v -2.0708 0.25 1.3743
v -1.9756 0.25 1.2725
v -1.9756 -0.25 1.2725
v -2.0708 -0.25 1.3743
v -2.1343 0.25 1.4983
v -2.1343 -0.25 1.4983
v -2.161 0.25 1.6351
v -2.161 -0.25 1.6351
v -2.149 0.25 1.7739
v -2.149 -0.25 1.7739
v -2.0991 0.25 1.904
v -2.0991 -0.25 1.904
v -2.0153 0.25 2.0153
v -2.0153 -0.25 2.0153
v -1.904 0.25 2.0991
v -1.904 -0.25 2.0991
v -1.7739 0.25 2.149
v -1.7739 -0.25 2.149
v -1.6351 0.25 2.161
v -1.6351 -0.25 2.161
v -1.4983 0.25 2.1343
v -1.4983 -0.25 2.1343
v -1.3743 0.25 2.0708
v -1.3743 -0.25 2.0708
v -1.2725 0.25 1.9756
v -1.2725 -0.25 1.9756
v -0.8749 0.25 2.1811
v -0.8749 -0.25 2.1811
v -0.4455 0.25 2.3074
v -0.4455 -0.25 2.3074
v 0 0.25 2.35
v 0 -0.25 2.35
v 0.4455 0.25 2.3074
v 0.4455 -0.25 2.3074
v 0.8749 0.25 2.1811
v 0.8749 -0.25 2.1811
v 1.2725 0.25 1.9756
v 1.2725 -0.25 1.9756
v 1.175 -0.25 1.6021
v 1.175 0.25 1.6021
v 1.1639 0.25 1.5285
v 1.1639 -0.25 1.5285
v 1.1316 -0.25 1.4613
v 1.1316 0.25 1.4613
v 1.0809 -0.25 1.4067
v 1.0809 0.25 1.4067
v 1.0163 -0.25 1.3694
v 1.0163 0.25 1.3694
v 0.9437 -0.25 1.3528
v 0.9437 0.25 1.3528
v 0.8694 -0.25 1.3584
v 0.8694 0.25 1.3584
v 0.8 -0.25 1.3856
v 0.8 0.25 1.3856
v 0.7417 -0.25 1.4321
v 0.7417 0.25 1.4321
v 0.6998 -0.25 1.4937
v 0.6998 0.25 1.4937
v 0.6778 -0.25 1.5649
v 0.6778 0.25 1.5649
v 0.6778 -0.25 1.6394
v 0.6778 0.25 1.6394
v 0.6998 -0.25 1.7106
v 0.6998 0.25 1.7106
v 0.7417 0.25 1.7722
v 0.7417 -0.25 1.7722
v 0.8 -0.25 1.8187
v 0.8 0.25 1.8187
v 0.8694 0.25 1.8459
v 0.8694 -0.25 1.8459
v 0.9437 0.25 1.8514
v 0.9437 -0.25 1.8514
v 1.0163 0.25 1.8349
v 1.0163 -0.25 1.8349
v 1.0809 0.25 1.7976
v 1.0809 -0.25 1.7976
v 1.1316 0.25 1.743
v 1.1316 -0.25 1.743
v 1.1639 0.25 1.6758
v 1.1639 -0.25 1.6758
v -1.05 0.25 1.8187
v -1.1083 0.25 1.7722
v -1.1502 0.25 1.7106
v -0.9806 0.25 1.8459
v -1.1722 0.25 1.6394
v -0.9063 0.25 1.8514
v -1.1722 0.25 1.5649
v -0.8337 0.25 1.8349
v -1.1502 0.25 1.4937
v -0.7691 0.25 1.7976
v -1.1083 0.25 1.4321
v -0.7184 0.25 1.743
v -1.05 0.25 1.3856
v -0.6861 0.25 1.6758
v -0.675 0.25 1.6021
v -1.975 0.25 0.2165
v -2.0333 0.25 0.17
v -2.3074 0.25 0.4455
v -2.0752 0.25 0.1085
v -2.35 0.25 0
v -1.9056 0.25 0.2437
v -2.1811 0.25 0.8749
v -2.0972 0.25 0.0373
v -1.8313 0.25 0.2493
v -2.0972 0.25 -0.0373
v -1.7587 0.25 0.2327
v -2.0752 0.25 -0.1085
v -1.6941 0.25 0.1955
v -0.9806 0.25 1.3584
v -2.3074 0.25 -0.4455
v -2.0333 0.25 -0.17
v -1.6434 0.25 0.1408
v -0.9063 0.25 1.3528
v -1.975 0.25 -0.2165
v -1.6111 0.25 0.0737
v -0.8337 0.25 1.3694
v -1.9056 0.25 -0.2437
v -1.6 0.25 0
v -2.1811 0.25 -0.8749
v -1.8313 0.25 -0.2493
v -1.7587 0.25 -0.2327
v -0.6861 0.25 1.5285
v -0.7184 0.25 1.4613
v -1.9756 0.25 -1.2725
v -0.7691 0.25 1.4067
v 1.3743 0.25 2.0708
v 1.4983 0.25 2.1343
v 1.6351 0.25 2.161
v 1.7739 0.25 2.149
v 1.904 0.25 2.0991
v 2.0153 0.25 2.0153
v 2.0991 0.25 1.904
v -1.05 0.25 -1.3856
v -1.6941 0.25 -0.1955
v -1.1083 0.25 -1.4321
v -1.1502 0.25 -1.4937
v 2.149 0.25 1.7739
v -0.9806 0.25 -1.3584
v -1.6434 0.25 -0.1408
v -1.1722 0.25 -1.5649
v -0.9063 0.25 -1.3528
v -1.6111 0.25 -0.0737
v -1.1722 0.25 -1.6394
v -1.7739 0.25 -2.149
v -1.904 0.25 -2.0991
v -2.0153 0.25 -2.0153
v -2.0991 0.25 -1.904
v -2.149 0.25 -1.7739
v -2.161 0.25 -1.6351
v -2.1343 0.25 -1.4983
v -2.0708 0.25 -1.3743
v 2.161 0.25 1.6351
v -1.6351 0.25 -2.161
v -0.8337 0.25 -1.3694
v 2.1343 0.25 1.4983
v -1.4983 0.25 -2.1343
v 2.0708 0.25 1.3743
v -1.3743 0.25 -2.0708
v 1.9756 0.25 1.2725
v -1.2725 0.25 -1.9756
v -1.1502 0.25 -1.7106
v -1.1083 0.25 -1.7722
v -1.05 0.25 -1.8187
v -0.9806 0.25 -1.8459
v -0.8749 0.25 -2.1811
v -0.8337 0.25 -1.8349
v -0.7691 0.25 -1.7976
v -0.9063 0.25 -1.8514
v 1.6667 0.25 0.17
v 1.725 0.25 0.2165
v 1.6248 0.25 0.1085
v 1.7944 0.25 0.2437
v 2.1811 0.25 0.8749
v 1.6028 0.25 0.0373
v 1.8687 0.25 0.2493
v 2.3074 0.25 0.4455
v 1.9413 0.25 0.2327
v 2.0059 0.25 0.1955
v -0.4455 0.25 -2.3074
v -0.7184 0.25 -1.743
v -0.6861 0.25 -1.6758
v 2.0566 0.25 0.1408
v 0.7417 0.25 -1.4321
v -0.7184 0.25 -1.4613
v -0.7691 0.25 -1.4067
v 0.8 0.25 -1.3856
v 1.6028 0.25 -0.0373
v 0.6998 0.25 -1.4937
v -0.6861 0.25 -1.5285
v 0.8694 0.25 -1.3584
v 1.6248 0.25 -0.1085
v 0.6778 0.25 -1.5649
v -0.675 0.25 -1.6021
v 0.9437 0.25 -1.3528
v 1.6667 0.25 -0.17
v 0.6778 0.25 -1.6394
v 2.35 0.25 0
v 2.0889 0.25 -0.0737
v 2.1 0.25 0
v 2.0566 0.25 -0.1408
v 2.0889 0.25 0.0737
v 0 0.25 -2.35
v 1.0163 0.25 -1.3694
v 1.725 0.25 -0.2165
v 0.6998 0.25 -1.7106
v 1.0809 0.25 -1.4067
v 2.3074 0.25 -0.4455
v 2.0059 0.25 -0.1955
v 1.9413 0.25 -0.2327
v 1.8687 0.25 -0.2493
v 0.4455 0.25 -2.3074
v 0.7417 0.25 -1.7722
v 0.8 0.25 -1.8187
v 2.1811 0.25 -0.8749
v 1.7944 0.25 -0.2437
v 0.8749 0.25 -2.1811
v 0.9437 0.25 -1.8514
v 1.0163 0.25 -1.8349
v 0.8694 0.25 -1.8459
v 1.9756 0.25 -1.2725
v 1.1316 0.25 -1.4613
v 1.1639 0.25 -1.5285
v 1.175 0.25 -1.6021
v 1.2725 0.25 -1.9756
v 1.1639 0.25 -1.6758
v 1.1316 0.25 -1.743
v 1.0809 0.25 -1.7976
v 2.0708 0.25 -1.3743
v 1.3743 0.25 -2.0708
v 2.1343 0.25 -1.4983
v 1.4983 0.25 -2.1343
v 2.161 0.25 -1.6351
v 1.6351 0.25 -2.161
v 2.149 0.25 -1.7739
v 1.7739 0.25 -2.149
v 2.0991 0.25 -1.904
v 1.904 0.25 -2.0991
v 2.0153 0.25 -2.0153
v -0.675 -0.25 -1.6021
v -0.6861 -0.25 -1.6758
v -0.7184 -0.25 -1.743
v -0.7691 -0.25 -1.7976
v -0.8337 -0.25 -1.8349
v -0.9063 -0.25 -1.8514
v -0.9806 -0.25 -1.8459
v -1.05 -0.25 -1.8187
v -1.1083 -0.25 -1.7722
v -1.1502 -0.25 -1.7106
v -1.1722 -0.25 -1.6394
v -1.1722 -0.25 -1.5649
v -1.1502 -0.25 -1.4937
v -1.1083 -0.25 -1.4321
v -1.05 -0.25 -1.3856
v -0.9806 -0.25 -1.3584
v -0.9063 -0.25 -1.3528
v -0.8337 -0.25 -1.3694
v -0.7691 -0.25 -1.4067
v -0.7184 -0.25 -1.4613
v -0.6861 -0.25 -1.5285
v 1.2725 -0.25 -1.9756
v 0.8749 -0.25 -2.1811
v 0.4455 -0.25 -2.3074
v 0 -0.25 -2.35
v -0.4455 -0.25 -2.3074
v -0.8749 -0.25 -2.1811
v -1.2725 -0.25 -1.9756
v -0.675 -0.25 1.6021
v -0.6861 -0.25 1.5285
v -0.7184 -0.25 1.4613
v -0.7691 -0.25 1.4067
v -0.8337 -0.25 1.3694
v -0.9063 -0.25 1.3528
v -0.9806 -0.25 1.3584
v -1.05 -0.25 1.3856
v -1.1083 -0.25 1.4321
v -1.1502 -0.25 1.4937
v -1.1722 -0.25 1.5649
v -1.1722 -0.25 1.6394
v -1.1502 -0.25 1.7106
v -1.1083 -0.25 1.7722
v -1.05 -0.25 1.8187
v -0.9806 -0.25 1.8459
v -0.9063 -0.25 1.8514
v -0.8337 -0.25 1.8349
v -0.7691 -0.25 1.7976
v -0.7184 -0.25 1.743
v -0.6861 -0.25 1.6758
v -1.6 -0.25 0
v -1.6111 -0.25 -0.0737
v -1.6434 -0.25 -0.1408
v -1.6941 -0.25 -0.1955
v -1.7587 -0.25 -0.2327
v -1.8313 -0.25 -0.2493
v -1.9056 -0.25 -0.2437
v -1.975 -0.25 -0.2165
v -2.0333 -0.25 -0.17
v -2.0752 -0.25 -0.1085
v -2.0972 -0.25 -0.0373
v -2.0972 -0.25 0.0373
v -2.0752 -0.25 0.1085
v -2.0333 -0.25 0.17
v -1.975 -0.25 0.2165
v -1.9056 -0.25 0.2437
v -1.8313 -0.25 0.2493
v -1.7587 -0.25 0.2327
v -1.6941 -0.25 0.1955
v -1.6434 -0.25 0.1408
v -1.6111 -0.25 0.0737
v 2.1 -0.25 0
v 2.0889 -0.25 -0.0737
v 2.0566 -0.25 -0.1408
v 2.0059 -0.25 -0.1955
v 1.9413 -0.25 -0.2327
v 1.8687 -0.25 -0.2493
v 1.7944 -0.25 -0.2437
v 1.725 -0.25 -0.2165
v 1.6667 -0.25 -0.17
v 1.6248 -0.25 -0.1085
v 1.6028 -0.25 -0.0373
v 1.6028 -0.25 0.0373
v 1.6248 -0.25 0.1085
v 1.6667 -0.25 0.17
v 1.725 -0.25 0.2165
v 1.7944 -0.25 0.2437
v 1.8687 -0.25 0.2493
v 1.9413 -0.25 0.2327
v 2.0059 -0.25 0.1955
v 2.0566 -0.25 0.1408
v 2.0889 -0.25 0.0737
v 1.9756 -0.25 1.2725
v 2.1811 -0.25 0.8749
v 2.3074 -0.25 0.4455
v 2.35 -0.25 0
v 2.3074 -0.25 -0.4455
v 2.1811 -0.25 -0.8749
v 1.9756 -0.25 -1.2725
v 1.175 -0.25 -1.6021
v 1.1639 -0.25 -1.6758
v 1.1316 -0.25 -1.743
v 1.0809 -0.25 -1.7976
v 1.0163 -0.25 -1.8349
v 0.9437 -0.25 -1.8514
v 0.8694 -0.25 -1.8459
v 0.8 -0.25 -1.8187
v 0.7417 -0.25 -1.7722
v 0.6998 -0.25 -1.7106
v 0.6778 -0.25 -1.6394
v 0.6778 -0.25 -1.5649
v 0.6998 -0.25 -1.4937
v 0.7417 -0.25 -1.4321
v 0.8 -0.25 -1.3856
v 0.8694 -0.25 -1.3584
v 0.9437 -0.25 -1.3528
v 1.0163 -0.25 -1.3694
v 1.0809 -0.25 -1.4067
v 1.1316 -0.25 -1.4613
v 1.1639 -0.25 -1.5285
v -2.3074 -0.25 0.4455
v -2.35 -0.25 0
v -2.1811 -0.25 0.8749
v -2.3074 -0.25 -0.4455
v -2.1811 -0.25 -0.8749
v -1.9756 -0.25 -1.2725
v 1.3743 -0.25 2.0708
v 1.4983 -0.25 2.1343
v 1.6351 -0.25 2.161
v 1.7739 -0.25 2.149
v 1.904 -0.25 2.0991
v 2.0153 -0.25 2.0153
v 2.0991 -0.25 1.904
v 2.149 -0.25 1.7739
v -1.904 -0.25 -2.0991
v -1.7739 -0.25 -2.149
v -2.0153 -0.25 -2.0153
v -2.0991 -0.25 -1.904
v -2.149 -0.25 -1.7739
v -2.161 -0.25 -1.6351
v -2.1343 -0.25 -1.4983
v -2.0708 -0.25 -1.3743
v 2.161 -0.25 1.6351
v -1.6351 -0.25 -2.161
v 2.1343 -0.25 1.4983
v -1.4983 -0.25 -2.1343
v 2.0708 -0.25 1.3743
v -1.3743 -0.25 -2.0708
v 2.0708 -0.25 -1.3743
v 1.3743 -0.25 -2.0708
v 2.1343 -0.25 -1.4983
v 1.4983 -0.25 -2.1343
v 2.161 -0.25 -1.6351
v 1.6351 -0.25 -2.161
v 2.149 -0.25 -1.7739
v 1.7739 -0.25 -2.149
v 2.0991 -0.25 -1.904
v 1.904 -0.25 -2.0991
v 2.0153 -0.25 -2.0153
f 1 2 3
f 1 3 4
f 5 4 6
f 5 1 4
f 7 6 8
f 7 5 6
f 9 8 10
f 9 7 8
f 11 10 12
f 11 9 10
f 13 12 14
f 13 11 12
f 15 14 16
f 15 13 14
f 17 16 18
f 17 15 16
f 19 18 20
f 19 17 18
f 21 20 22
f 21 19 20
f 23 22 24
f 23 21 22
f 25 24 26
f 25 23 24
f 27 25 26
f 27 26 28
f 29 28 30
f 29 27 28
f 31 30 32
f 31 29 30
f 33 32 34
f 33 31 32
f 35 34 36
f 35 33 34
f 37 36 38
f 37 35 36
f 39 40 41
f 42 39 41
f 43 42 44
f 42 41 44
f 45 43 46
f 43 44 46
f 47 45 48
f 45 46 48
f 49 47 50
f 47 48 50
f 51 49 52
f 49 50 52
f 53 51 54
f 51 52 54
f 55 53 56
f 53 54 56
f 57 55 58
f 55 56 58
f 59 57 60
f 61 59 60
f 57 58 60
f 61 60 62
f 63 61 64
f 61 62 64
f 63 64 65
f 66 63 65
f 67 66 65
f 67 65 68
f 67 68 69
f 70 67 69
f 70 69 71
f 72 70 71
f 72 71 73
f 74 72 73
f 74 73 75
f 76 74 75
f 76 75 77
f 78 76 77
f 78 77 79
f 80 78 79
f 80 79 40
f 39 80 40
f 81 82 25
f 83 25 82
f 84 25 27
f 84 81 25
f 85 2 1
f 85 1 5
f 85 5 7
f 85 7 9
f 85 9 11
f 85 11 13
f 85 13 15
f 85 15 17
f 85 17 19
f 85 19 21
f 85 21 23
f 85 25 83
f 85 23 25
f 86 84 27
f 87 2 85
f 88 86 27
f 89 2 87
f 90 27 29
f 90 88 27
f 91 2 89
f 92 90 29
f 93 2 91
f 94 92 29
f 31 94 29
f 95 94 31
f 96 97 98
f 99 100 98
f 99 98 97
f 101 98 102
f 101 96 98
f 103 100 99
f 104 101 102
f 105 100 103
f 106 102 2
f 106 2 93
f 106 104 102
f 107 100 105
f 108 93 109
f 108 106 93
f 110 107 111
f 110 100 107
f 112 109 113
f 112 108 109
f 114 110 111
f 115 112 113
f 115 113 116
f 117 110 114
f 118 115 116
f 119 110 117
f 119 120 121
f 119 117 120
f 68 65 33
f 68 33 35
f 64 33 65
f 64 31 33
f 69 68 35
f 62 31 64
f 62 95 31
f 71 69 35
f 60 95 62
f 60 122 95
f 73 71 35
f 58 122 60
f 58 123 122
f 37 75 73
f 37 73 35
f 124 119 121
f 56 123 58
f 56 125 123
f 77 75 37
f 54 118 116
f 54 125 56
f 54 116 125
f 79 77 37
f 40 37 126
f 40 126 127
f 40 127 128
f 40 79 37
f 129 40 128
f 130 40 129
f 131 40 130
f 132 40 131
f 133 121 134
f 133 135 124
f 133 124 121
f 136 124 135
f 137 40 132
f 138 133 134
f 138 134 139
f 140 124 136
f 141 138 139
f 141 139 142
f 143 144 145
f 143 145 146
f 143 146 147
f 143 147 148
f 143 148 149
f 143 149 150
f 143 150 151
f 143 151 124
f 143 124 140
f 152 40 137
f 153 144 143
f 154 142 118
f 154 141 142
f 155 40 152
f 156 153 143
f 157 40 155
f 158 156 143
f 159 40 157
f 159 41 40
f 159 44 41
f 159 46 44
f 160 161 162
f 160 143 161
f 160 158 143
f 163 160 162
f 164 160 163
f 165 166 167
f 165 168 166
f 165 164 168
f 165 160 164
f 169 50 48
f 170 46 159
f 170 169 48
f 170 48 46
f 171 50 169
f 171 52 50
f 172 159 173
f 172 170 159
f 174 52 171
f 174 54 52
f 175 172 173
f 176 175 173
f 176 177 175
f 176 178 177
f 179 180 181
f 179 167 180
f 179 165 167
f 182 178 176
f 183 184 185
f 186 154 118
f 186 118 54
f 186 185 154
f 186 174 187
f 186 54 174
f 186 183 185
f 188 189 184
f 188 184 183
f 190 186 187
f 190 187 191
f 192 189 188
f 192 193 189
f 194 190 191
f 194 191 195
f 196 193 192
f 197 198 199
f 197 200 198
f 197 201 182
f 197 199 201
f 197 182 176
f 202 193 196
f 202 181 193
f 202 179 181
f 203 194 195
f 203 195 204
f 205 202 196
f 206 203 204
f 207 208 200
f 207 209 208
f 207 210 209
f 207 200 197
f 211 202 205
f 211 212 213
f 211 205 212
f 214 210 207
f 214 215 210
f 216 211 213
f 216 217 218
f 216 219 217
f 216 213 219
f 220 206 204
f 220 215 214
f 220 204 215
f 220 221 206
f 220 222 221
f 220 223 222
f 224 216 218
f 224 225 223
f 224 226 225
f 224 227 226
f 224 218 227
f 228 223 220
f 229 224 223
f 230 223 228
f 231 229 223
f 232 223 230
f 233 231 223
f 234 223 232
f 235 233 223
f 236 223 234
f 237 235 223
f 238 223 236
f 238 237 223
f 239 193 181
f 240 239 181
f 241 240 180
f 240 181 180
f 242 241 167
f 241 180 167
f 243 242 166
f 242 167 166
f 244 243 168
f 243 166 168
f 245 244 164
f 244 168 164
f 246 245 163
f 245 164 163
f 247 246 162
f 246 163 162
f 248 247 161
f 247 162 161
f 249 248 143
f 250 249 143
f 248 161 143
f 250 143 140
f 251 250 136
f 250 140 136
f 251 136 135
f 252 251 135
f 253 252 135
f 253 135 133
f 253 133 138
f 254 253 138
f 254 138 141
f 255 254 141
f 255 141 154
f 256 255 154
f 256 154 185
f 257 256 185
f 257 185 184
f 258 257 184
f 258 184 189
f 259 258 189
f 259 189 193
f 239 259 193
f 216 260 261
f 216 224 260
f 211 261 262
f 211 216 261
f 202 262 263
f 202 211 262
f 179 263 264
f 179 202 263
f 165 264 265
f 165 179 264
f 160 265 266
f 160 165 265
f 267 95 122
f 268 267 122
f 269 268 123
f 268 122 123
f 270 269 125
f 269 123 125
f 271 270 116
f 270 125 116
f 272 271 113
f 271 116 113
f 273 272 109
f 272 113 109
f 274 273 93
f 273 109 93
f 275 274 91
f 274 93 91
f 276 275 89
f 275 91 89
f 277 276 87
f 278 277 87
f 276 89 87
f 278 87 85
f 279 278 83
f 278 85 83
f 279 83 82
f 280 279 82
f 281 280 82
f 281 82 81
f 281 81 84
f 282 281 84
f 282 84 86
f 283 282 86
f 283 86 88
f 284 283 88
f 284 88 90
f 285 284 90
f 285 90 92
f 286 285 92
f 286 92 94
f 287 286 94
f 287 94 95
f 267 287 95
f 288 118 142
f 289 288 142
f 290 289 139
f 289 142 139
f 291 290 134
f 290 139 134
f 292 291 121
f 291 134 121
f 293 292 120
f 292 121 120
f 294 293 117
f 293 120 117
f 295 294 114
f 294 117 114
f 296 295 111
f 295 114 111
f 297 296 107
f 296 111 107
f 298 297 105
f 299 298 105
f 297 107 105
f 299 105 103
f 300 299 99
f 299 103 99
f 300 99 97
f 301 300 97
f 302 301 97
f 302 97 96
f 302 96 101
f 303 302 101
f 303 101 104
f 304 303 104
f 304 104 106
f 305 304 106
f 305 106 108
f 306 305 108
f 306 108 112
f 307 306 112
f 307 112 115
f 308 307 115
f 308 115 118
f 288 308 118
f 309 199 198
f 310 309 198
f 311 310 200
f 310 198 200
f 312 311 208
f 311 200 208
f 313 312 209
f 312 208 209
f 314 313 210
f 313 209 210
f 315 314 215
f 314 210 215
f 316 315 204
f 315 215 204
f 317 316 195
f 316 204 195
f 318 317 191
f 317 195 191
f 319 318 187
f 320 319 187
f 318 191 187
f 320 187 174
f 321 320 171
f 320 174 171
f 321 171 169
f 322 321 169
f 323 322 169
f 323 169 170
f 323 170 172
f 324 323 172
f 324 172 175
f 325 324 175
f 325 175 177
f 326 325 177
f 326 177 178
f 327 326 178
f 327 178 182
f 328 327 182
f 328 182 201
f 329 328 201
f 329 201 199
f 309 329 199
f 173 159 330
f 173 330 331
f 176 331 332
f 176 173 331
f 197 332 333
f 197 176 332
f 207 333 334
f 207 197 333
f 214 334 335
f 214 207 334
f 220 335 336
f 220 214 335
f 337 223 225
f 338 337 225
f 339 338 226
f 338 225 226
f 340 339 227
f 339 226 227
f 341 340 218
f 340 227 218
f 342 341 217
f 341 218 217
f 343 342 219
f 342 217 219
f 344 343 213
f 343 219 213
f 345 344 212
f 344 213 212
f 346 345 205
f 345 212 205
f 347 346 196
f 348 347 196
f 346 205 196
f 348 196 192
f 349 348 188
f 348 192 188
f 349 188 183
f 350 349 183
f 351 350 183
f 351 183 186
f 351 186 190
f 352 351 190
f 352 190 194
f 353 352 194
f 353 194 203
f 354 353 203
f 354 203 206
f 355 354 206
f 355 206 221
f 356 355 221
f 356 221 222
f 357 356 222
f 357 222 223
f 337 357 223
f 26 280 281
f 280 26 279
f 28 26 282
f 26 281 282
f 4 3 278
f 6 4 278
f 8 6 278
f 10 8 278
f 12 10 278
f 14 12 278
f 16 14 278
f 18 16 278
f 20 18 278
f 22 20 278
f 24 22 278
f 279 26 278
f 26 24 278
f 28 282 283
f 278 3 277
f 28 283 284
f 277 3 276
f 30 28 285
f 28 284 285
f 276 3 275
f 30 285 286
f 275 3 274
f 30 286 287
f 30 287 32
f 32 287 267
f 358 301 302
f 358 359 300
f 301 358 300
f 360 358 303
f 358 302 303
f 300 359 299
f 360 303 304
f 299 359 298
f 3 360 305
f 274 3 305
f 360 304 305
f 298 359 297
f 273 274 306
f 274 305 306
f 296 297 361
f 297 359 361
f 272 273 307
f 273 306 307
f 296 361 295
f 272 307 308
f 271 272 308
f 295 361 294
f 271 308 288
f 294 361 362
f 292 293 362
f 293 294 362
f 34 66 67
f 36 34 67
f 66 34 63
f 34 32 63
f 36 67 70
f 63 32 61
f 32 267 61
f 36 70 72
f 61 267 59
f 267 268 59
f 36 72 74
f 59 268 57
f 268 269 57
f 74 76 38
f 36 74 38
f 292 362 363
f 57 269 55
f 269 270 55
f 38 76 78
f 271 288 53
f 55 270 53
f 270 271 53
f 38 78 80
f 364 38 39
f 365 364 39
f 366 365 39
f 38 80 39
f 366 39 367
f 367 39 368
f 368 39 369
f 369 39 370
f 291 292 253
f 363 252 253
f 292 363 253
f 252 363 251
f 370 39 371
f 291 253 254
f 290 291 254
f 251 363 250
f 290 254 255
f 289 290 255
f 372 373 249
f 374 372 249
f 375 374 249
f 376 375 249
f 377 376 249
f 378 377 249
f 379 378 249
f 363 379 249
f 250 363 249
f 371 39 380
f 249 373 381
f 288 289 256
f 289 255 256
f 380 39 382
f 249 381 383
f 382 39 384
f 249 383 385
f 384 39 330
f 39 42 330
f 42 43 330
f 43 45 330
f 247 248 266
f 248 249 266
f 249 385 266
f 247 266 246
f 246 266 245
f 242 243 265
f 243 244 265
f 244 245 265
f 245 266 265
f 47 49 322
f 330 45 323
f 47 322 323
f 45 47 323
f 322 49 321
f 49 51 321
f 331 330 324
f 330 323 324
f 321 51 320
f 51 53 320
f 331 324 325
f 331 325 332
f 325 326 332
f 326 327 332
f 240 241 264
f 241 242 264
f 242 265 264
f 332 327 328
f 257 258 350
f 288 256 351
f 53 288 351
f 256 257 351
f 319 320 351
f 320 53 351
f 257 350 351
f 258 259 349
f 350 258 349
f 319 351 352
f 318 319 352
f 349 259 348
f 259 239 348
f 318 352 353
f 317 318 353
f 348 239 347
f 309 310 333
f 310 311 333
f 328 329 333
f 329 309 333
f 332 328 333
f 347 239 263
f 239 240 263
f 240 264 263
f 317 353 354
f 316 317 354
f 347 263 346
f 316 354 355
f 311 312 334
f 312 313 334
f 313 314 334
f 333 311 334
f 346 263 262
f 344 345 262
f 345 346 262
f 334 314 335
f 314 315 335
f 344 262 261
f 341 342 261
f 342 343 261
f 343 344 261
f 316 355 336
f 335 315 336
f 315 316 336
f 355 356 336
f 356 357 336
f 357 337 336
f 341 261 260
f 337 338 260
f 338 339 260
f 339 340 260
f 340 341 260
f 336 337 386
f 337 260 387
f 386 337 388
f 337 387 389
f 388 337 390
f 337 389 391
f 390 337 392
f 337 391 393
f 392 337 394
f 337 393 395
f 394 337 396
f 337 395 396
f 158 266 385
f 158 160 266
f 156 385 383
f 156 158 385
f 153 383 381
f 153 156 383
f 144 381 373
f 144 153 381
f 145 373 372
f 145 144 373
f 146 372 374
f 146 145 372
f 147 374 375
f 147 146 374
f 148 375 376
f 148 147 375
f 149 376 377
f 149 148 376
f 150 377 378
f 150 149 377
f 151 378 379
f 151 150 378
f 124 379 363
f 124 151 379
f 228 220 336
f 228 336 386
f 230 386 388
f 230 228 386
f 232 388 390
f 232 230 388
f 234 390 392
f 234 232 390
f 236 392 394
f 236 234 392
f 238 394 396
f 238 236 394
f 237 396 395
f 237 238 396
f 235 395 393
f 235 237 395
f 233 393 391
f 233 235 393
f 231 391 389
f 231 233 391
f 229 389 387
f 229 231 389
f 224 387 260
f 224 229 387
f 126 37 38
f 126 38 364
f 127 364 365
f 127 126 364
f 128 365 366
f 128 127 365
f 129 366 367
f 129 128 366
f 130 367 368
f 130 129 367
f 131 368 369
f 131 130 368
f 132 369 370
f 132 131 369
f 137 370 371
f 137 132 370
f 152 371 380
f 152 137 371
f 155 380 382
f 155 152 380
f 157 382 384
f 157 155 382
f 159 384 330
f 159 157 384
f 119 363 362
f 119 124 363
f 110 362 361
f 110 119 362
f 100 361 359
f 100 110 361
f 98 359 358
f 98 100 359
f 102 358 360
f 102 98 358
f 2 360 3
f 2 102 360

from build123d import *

# Parameters (mm, degrees)
BOSS_EXTRUDE1_DEPTH = 0.25
CUT_EXTRUDE1_REACH  = 2.5
SKETCH2_R           = 0.25


with BuildPart() as part:
    # Sketch1 → Boss-Extrude1 (new body, symmetric)
    with BuildSketch(Plane(origin=(0, 0, 0), x_dir=(1, 0, 0), z_dir=(0, 1, 0))):
        with BuildLine():
            ThreePointArc((-1.975635929, 1.272541817), (-2.35, 0), (-1.975635929, -1.272541817))
            ThreePointArc((-1.975635929, -1.272541817), (-2.015254326, -2.015254326), (-1.272541817, -1.975635929))
            ThreePointArc((-1.272541817, -1.975635929), (0, -2.35), (1.272541817, -1.975635929))
            ThreePointArc((1.272541817, -1.975635929), (2.015254326, -2.015254326), (1.975635929, -1.272541817))
            ThreePointArc((1.975635929, -1.272541817), (2.35, 0), (1.975635929, 1.272541817))
            ThreePointArc((1.975635929, 1.272541817), (2.015254326, 2.015254326), (1.272541817, 1.975635929))
            ThreePointArc((1.272541817, 1.975635929), (0, 2.35), (-1.272541817, 1.975635929))
            ThreePointArc((-1.272541817, 1.975635929), (-2.015254326, 2.015254326), (-1.975635929, 1.272541817))
        make_face()
    extrude(amount=BOSS_EXTRUDE1_DEPTH, both=True)

    # Sketch2 → Cut-Extrude1 (cut, up to next)
    with BuildSketch(Plane(origin=(0, 0.25, 0), x_dir=(1, 0, 0), z_dir=(0, 1, 0)), mode=Mode.PRIVATE) as cut_extrude1_sk1:
        with Locations((-1.85, 0)):
            Circle(SKETCH2_R)
    cut_extrude1_tool1 = extrude(cut_extrude1_sk1.sketch, amount=-CUT_EXTRUDE1_REACH, mode=Mode.PRIVATE) & part.part
    add(cut_extrude1_tool1.solids().sort_by_distance((-1.85, 0.25, 0))[0], mode=Mode.SUBTRACT)
    # Sketch2 → Cut-Extrude1 (cut, up to next)
    with BuildSketch(Plane(origin=(0, 0.25, 0), x_dir=(1, 0, 0), z_dir=(0, 1, 0)), mode=Mode.PRIVATE) as cut_extrude1_sk2:
        with Locations((-0.925, 1.602146997)):
            Circle(SKETCH2_R)
    cut_extrude1_tool2 = extrude(cut_extrude1_sk2.sketch, amount=-CUT_EXTRUDE1_REACH, mode=Mode.PRIVATE) & part.part
    add(cut_extrude1_tool2.solids().sort_by_distance((-0.925, 0.25, -1.602147))[0], mode=Mode.SUBTRACT)
    # Sketch2 → Cut-Extrude1 (cut, up to next)
    with BuildSketch(Plane(origin=(0, 0.25, 0), x_dir=(1, 0, 0), z_dir=(0, 1, 0)), mode=Mode.PRIVATE) as cut_extrude1_sk3:
        with Locations((0.925, 1.602146997)):
            Circle(SKETCH2_R)
    cut_extrude1_tool3 = extrude(cut_extrude1_sk3.sketch, amount=-CUT_EXTRUDE1_REACH, mode=Mode.PRIVATE) & part.part
    add(cut_extrude1_tool3.solids().sort_by_distance((0.925, 0.25, -1.602147))[0], mode=Mode.SUBTRACT)
    # Sketch2 → Cut-Extrude1 (cut, up to next)
    with BuildSketch(Plane(origin=(0, 0.25, 0), x_dir=(1, 0, 0), z_dir=(0, 1, 0)), mode=Mode.PRIVATE) as cut_extrude1_sk4:
        with Locations((1.85, 0)):
            Circle(SKETCH2_R)
    cut_extrude1_tool4 = extrude(cut_extrude1_sk4.sketch, amount=-CUT_EXTRUDE1_REACH, mode=Mode.PRIVATE) & part.part
    add(cut_extrude1_tool4.solids().sort_by_distance((1.85, 0.25, 0))[0], mode=Mode.SUBTRACT)
    # Sketch2 → Cut-Extrude1 (cut, up to next)
    with BuildSketch(Plane(origin=(0, 0.25, 0), x_dir=(1, 0, 0), z_dir=(0, 1, 0)), mode=Mode.PRIVATE) as cut_extrude1_sk5:
        with Locations((0.925, -1.602146997)):
            Circle(SKETCH2_R)
    cut_extrude1_tool5 = extrude(cut_extrude1_sk5.sketch, amount=-CUT_EXTRUDE1_REACH, mode=Mode.PRIVATE) & part.part
    add(cut_extrude1_tool5.solids().sort_by_distance((0.925, 0.25, 1.602147))[0], mode=Mode.SUBTRACT)
    # Sketch2 → Cut-Extrude1 (cut, up to next)
    with BuildSketch(Plane(origin=(0, 0.25, 0), x_dir=(1, 0, 0), z_dir=(0, 1, 0)), mode=Mode.PRIVATE) as cut_extrude1_sk6:
        with Locations((-0.925, -1.602146997)):
            Circle(SKETCH2_R)
    cut_extrude1_tool6 = extrude(cut_extrude1_sk6.sketch, amount=-CUT_EXTRUDE1_REACH, mode=Mode.PRIVATE) & part.part
    add(cut_extrude1_tool6.solids().sort_by_distance((-0.925, 0.25, 1.602147))[0], mode=Mode.SUBTRACT)


solid = part.part
